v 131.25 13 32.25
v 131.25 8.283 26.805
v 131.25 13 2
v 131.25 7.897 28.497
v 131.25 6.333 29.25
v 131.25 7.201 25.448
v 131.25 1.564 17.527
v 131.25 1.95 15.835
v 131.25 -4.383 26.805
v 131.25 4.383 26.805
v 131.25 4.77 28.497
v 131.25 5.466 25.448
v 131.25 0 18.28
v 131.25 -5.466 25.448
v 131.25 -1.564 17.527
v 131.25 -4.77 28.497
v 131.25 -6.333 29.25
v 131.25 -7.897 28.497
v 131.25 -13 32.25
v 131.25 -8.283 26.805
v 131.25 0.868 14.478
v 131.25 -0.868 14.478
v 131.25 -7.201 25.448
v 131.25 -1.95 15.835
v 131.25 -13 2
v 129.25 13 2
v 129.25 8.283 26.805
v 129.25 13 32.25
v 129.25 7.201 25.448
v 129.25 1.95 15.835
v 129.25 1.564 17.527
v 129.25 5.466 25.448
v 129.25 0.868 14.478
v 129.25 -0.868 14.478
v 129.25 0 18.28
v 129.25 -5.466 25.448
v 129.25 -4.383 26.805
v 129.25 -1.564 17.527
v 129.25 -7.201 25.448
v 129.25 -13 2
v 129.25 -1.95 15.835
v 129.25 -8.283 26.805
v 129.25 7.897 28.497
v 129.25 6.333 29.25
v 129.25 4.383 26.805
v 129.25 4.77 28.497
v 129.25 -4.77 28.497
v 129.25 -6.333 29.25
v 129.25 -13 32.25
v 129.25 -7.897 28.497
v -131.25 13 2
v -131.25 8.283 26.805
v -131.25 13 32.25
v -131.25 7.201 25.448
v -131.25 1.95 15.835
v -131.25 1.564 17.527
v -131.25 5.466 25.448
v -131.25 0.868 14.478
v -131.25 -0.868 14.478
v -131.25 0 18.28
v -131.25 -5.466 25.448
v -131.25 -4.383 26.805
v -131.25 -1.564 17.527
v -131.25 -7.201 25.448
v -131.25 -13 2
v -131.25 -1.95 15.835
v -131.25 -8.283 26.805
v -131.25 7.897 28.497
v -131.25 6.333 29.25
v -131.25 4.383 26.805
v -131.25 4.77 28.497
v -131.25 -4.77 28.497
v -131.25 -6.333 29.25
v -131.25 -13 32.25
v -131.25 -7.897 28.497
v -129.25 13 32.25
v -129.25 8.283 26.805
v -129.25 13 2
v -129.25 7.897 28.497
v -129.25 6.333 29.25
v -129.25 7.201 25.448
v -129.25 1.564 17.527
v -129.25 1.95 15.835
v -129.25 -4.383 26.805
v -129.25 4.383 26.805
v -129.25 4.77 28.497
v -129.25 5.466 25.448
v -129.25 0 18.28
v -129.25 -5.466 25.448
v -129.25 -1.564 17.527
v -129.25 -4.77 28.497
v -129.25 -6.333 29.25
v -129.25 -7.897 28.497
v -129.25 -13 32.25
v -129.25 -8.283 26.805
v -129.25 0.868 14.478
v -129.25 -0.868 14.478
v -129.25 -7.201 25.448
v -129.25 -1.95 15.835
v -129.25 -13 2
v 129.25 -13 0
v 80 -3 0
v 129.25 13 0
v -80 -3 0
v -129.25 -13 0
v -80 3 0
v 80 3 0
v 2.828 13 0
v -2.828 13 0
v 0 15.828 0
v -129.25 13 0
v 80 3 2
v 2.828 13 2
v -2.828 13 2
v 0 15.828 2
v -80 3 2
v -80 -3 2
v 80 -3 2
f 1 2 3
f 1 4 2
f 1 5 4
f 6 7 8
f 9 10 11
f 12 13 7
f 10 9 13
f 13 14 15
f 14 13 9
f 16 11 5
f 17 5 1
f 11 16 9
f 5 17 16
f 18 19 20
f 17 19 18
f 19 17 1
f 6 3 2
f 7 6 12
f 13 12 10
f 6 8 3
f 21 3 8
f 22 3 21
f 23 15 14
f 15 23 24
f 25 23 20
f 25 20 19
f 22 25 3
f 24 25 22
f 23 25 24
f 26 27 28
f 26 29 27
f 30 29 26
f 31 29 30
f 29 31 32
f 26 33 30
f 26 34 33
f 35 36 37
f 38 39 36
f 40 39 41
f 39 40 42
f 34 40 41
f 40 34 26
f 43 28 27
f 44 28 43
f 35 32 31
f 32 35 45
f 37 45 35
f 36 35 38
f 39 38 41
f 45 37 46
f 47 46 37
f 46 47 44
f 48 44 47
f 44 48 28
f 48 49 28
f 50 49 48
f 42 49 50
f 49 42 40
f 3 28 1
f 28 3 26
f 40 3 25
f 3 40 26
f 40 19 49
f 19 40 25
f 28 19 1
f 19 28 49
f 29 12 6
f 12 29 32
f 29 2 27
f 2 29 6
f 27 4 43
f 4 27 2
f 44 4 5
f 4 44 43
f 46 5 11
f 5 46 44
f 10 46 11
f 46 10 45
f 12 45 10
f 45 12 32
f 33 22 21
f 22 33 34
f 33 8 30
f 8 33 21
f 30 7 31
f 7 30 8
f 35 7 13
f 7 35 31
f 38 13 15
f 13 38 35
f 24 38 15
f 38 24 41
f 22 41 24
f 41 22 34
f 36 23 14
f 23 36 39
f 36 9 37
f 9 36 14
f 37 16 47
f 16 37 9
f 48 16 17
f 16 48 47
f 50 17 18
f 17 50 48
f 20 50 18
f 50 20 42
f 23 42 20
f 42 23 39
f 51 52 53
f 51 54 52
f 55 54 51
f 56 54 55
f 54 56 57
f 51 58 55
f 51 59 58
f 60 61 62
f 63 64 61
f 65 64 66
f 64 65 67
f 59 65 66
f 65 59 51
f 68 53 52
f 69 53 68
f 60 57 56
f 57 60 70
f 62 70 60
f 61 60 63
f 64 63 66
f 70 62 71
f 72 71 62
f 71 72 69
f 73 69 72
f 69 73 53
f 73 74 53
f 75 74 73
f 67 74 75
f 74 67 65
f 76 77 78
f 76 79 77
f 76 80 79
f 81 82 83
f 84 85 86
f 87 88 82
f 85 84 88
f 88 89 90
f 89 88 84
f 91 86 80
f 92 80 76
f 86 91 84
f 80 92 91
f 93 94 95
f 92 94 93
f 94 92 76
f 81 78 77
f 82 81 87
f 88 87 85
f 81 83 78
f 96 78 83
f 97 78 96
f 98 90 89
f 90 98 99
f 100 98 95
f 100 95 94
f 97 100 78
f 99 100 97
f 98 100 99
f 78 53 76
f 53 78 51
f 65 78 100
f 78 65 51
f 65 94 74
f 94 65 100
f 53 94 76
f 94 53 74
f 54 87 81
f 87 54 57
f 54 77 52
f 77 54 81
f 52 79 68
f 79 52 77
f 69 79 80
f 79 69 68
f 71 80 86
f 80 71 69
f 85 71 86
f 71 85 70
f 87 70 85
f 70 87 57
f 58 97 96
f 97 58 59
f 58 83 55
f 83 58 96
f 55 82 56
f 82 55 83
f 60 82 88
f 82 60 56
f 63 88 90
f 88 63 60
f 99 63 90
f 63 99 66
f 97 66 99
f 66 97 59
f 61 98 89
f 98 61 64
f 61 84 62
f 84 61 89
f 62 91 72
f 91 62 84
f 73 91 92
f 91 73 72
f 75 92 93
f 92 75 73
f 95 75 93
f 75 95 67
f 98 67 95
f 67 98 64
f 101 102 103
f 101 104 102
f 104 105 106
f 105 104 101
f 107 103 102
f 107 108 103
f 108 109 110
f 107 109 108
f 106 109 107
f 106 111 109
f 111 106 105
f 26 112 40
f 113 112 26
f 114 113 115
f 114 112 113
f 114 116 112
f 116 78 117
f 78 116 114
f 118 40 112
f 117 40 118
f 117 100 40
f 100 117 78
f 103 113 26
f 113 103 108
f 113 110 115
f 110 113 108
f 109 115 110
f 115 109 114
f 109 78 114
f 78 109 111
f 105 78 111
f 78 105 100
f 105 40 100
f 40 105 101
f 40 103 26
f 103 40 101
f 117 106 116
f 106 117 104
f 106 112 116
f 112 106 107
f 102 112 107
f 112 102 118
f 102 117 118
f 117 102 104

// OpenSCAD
// file: rear_standard_carrier_screw_holes.scad
include <../../constants.scad>

module rear_standard_carrier_screw_holes() {
    side_length = rear_standard_carrier_screw_hole_triangle_side_length;
    height = rear_standard_carrier_screw_hole_triangle_height;
    translate(v = [height / 2,side_length / 2]) {
        circle(d = rear_standard_carrier_screw_hole_diameter);
    }
    translate(v = [height / 2,-side_length / 2]) {
        circle(d = rear_standard_carrier_screw_hole_diameter);
    }
    translate(v = [-height / 2,0]) {
        circle(d = rear_standard_carrier_screw_hole_diameter);
    }
}

rear_standard_carrier_screw_holes();
// file: ../../constants.scad
/********************
* Table of Contents *
* *******************/
// 1. Materials
// 2. Rear Standard
    // 2.1 Rear Standard Carrier
// 3. Front Standard
// 4. Base
// 5. Ground Glass
// 6. Film Cassette



/****************
* 1. Materials  *
* **************/
    sheet_metal_thickness_structural = 2;
    screw_hole_metric_3 = 3;
    screw_hole_metric_4 = 4;
    screw_hole_metric_5 = 5;
    screw_hole_metric_6 = 6;

/********************
* 2. Rear Standard  *
* *******************/

    // 2.1 Rear Standard Carrier
    rear_standard_carrier_thickness = sheet_metal_thickness_structural;
    rear_standard_carrier_width = 26;
    rear_standard_carrier_base_length = 258.5;
    rear_standard_carrier_base_flat_length = 30.25;
    rear_standard_carrier_base_slot_length = 160;
    rear_standard_carrier_base_slot_width = 6;
    rear_standard_carrier_upright_length = 149;
    rear_standard_carrier_upright_slot_width = 6;
    rear_standard_carrier_screw_hole_diameter = screw_hole_metric_4;
    rear_standard_carrier_screw_hole_triangle_side_length = (rear_standard_carrier_width / 3) + rear_standard_carrier_screw_hole_diameter;
    rear_standard_carrier_screw_hole_triangle_height = (rear_standard_carrier_screw_hole_triangle_side_length * sqrt(3)) / 2;
    rear_standard_carrier_screw_hole_triangle_top_margin = 5;
// main file
include <../../constants.scad>
use <rear_standard_carrier_screw_holes.scad>

module rear_standard_carrier_base_flat () {
    linear_extrude(height = rear_standard_carrier_thickness) {
        difference() {
            triangle_offset = (rear_standard_carrier_base_flat_length / 2) - (rear_standard_carrier_screw_hole_triangle_height / 2) - rear_standard_carrier_screw_hole_triangle_top_margin;
            square(size = [rear_standard_carrier_base_flat_length, rear_standard_carrier_width], center = true);
            translate(v = [triangle_offset,0,0]) {
                rear_standard_carrier_screw_holes();
            } 
        }
    }
}

// rear_standard_carrier_base_flat();
module rear_standard_carrier_base(folded = true) {
    linear_extrude(height = rear_standard_carrier_thickness) {
        difference() {
            union() {
                square([rear_standard_carrier_base_length, rear_standard_carrier_width], center = true);

                // Zero marker
                zero_marker_offset = rear_standard_carrier_width / 2;
                translate(v = [0,zero_marker_offset,0]) {    
                    rotate(a = 45, v = [0,0,1]) {
                        square(size = [4,4], center = true);
                    }
                } 
            }
            // slot
            square([rear_standard_carrier_base_slot_length, rear_standard_carrier_base_slot_width], center = true);
        }
    }

    // Flats
    flat_offset_x = (rear_standard_carrier_base_length / 2) + (rear_standard_carrier_thickness);
    flat_offset_y = (rear_standard_carrier_base_flat_length / 2) + rear_standard_carrier_thickness;
    flat_offset_unfolded = (rear_standard_carrier_base_length / 2) + (rear_standard_carrier_base_flat_length / 2) + 3;
    if (folded == true) {  
        translate(v = [flat_offset_x,0,flat_offset_y]) {
            rotate(a = -90, v = [0,1,0]) {
                rear_standard_carrier_base_flat();
            }
        }
        mirror(v = [1,0,0]) {
            translate(v = [flat_offset_x,0,flat_offset_y]) {
            rotate(a = -90, v = [0,1,0]) {
                rear_standard_carrier_base_flat();
            }
        }
        } 
    }
    if (folded == false) {
        translate(v = [flat_offset_unfolded,0,0]) {
            rear_standard_carrier_base_flat();
        }
        mirror(v = [1,0,0]) {
            translate(v = [flat_offset_unfolded,0,0]) {
                rear_standard_carrier_base_flat();
            }
        } 
    }

}

rear_standard_carrier_base(folded = true);
